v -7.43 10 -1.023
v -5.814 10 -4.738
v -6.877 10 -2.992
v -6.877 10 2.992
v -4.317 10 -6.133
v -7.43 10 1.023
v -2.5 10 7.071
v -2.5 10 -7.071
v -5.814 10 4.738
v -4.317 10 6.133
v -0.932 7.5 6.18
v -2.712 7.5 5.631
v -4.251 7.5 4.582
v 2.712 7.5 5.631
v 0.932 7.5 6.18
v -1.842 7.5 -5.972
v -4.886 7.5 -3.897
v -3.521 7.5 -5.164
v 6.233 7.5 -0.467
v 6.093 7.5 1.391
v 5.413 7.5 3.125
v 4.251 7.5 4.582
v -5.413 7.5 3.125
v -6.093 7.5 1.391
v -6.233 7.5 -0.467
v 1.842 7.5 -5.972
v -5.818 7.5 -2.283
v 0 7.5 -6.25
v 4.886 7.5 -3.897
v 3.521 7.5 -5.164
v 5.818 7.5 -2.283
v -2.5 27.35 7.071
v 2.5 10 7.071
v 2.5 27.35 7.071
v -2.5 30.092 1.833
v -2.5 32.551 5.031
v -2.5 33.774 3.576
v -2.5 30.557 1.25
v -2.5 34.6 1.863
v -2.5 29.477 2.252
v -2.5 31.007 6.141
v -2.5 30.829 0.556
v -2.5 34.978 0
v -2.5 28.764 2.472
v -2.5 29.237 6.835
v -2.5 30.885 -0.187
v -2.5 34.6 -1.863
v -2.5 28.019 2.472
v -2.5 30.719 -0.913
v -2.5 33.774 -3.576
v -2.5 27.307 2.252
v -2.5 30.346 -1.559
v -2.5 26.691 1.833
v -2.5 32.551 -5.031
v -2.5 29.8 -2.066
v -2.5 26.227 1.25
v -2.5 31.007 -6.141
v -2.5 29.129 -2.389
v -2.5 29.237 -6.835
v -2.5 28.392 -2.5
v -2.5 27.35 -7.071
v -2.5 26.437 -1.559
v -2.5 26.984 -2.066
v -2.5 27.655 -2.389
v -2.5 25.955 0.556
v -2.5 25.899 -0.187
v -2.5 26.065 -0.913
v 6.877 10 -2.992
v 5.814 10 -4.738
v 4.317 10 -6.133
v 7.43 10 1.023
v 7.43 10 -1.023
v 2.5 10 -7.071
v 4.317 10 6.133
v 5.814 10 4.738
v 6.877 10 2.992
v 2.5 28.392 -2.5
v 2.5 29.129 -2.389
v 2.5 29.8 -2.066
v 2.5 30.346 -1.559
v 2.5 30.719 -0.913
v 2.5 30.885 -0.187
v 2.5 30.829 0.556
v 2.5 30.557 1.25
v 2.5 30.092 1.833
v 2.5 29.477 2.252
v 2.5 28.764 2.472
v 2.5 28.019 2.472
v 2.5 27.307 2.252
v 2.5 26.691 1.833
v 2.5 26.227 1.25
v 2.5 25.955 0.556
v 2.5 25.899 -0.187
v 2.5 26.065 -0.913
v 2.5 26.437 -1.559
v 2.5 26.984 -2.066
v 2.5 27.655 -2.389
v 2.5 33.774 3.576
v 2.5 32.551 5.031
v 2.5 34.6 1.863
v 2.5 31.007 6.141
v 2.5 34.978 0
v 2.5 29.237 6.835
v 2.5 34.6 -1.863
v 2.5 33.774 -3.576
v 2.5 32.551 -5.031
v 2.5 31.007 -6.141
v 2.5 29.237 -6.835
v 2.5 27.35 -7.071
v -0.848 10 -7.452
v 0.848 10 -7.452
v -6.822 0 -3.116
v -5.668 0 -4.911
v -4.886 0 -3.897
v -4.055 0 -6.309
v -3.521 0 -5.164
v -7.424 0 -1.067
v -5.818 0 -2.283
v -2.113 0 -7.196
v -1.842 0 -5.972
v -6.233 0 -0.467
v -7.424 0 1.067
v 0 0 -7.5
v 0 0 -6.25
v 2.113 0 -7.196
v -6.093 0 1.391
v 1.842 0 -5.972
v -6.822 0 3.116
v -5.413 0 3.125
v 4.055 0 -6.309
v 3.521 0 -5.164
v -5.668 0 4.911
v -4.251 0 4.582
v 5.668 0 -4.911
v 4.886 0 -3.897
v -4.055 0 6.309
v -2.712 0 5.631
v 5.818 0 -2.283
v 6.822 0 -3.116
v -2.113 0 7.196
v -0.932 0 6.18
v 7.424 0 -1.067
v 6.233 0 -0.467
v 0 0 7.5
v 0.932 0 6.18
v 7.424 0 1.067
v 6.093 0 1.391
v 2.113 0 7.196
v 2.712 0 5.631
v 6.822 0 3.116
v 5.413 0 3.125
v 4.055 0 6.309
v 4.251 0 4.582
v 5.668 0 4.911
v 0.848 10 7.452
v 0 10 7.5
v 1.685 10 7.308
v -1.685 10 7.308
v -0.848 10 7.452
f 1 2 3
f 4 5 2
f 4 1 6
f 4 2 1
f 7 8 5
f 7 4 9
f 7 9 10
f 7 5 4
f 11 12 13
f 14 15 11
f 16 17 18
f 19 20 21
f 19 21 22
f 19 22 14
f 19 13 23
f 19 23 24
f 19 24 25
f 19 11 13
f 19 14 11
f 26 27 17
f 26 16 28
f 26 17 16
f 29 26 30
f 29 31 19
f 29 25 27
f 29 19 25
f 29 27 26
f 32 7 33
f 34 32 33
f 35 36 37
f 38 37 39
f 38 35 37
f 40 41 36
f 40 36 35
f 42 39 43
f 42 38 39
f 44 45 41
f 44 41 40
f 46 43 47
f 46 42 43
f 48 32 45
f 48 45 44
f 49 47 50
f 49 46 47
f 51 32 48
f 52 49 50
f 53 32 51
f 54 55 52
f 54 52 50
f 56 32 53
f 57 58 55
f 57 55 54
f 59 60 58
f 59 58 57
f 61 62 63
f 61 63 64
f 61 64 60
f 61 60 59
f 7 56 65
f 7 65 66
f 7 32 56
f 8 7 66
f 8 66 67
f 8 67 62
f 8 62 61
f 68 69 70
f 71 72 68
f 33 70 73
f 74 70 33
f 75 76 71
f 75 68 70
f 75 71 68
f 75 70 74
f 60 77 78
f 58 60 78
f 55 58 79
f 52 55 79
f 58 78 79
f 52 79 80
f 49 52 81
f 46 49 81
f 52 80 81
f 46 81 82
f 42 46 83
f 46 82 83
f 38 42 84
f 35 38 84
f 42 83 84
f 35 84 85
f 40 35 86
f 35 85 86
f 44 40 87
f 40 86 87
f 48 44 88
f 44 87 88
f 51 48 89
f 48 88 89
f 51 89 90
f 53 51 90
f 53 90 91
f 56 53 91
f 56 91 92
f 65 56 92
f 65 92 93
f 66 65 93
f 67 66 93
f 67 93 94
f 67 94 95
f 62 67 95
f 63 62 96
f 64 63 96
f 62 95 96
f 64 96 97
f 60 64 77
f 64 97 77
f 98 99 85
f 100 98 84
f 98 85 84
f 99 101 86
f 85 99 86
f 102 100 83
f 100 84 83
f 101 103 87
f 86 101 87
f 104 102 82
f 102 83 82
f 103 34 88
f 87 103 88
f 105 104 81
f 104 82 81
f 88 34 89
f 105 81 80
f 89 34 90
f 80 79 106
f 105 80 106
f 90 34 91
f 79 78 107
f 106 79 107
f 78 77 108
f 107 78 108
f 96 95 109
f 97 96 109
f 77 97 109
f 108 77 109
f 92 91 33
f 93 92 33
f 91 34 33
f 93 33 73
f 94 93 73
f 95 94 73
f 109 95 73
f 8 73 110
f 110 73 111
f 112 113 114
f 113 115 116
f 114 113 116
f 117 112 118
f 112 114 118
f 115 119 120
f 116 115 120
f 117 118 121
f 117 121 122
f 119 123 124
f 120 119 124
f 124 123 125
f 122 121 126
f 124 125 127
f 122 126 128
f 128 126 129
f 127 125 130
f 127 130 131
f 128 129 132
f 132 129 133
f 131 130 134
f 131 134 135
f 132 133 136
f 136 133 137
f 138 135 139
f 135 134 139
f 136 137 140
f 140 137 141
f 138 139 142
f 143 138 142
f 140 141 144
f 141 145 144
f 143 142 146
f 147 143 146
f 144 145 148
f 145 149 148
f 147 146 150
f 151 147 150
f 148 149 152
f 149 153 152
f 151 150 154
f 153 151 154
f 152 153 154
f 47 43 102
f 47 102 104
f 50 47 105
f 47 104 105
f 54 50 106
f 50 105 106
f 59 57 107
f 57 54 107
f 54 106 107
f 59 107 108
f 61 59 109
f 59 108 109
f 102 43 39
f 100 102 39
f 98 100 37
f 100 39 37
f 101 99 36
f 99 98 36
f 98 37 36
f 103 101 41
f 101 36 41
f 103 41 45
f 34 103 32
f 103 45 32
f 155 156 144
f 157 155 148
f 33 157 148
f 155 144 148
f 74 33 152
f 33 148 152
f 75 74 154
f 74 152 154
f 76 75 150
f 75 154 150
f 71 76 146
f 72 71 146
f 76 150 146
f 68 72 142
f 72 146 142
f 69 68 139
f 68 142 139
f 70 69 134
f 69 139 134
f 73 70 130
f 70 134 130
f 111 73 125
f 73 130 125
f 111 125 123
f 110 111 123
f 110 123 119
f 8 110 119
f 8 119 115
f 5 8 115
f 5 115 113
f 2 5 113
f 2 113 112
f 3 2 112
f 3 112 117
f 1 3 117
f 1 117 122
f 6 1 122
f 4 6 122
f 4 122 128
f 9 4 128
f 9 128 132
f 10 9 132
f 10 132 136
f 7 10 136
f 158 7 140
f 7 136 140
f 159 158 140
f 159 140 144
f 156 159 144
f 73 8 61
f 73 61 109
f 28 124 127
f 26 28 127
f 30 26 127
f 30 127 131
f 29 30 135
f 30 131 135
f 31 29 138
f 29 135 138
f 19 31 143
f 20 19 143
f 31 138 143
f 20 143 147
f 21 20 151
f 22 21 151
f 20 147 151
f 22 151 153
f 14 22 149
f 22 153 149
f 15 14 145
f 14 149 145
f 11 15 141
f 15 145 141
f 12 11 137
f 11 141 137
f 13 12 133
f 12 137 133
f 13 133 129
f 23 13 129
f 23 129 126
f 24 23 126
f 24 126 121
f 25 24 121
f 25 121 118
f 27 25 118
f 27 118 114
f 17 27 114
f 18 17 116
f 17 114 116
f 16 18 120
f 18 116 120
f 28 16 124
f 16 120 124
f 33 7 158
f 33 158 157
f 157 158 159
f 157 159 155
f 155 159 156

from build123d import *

# Parameters (mm, degrees)
SKETCH1_R           = 7.5
BOSS_EXTRUDE1_DEPTH = 10
SKETCH2_R           = 6.25
CUT_EXTRUDE2_DEPTH  = 7.5
SKETCH3_W           = 5
SKETCH3_H           = 14.142135624
BOSS_EXTRUDE2_DEPTH = 25
SKETCH4_R           = 2.5
CUT_EXTRUDE3_DEPTH  = 5
FILLET1_R           = 7.65


with BuildPart() as part:
    # Sketch1 → Boss-Extrude1 (new body)
    with BuildSketch(Plane(origin=(0, 0, 0), x_dir=(1, 0, 0), z_dir=(0, 1, 0))):
        with Locations(Location((0, 0, 0), (0, 0, 270))):
            Circle(SKETCH1_R)
    extrude(amount=BOSS_EXTRUDE1_DEPTH)

    # Sketch2 → Cut-Extrude2 (cut)
    with BuildSketch(Plane.XZ):
        with Locations(Location((0, 0, 0), (0, 0, 270))):
            Circle(SKETCH2_R)
    extrude(amount=-CUT_EXTRUDE2_DEPTH, mode=Mode.SUBTRACT)

    # Sketch3 → Boss-Extrude2 (add)
    with BuildSketch(Plane(origin=(0, 10, 0), x_dir=(1, 0, 0), z_dir=(0, 1, 0))):
        Rectangle(SKETCH3_W, SKETCH3_H)
    extrude(amount=BOSS_EXTRUDE2_DEPTH)

    # Sketch4 → Cut-Extrude3 (cut)
    with BuildSketch(Plane(origin=(2.5, 0, 0), x_dir=(0, 0, -1), z_dir=(1, 0, 0))):
        with Locations((0, 28.391835492)):
            Circle(SKETCH4_R)
    extrude(amount=-CUT_EXTRUDE3_DEPTH, mode=Mode.SUBTRACT)

    # Fillet1
    # the kernel refuses this fillet: 7.65 mm, written as the material it takes off along each edge
    with BuildSketch(Plane(origin=(21.625, 35, -7.071067812), x_dir=(0, -1, 0), z_dir=(-1, 0, 0)), Plane(origin=(-21.625, 35, 7.071067812), x_dir=(0, -1, 0), z_dir=(1, 0, 0))) as fillet1_piece_1:
        with BuildLine():
            CenterArc((FILLET1_R, FILLET1_R), FILLET1_R, 180, 90)
            Line((0, FILLET1_R), (0, 0))
            Line((0, 0), (FILLET1_R, 0))
        make_face()
    extrude(amount=43.25, mode=Mode.SUBTRACT)


solid = part.part
